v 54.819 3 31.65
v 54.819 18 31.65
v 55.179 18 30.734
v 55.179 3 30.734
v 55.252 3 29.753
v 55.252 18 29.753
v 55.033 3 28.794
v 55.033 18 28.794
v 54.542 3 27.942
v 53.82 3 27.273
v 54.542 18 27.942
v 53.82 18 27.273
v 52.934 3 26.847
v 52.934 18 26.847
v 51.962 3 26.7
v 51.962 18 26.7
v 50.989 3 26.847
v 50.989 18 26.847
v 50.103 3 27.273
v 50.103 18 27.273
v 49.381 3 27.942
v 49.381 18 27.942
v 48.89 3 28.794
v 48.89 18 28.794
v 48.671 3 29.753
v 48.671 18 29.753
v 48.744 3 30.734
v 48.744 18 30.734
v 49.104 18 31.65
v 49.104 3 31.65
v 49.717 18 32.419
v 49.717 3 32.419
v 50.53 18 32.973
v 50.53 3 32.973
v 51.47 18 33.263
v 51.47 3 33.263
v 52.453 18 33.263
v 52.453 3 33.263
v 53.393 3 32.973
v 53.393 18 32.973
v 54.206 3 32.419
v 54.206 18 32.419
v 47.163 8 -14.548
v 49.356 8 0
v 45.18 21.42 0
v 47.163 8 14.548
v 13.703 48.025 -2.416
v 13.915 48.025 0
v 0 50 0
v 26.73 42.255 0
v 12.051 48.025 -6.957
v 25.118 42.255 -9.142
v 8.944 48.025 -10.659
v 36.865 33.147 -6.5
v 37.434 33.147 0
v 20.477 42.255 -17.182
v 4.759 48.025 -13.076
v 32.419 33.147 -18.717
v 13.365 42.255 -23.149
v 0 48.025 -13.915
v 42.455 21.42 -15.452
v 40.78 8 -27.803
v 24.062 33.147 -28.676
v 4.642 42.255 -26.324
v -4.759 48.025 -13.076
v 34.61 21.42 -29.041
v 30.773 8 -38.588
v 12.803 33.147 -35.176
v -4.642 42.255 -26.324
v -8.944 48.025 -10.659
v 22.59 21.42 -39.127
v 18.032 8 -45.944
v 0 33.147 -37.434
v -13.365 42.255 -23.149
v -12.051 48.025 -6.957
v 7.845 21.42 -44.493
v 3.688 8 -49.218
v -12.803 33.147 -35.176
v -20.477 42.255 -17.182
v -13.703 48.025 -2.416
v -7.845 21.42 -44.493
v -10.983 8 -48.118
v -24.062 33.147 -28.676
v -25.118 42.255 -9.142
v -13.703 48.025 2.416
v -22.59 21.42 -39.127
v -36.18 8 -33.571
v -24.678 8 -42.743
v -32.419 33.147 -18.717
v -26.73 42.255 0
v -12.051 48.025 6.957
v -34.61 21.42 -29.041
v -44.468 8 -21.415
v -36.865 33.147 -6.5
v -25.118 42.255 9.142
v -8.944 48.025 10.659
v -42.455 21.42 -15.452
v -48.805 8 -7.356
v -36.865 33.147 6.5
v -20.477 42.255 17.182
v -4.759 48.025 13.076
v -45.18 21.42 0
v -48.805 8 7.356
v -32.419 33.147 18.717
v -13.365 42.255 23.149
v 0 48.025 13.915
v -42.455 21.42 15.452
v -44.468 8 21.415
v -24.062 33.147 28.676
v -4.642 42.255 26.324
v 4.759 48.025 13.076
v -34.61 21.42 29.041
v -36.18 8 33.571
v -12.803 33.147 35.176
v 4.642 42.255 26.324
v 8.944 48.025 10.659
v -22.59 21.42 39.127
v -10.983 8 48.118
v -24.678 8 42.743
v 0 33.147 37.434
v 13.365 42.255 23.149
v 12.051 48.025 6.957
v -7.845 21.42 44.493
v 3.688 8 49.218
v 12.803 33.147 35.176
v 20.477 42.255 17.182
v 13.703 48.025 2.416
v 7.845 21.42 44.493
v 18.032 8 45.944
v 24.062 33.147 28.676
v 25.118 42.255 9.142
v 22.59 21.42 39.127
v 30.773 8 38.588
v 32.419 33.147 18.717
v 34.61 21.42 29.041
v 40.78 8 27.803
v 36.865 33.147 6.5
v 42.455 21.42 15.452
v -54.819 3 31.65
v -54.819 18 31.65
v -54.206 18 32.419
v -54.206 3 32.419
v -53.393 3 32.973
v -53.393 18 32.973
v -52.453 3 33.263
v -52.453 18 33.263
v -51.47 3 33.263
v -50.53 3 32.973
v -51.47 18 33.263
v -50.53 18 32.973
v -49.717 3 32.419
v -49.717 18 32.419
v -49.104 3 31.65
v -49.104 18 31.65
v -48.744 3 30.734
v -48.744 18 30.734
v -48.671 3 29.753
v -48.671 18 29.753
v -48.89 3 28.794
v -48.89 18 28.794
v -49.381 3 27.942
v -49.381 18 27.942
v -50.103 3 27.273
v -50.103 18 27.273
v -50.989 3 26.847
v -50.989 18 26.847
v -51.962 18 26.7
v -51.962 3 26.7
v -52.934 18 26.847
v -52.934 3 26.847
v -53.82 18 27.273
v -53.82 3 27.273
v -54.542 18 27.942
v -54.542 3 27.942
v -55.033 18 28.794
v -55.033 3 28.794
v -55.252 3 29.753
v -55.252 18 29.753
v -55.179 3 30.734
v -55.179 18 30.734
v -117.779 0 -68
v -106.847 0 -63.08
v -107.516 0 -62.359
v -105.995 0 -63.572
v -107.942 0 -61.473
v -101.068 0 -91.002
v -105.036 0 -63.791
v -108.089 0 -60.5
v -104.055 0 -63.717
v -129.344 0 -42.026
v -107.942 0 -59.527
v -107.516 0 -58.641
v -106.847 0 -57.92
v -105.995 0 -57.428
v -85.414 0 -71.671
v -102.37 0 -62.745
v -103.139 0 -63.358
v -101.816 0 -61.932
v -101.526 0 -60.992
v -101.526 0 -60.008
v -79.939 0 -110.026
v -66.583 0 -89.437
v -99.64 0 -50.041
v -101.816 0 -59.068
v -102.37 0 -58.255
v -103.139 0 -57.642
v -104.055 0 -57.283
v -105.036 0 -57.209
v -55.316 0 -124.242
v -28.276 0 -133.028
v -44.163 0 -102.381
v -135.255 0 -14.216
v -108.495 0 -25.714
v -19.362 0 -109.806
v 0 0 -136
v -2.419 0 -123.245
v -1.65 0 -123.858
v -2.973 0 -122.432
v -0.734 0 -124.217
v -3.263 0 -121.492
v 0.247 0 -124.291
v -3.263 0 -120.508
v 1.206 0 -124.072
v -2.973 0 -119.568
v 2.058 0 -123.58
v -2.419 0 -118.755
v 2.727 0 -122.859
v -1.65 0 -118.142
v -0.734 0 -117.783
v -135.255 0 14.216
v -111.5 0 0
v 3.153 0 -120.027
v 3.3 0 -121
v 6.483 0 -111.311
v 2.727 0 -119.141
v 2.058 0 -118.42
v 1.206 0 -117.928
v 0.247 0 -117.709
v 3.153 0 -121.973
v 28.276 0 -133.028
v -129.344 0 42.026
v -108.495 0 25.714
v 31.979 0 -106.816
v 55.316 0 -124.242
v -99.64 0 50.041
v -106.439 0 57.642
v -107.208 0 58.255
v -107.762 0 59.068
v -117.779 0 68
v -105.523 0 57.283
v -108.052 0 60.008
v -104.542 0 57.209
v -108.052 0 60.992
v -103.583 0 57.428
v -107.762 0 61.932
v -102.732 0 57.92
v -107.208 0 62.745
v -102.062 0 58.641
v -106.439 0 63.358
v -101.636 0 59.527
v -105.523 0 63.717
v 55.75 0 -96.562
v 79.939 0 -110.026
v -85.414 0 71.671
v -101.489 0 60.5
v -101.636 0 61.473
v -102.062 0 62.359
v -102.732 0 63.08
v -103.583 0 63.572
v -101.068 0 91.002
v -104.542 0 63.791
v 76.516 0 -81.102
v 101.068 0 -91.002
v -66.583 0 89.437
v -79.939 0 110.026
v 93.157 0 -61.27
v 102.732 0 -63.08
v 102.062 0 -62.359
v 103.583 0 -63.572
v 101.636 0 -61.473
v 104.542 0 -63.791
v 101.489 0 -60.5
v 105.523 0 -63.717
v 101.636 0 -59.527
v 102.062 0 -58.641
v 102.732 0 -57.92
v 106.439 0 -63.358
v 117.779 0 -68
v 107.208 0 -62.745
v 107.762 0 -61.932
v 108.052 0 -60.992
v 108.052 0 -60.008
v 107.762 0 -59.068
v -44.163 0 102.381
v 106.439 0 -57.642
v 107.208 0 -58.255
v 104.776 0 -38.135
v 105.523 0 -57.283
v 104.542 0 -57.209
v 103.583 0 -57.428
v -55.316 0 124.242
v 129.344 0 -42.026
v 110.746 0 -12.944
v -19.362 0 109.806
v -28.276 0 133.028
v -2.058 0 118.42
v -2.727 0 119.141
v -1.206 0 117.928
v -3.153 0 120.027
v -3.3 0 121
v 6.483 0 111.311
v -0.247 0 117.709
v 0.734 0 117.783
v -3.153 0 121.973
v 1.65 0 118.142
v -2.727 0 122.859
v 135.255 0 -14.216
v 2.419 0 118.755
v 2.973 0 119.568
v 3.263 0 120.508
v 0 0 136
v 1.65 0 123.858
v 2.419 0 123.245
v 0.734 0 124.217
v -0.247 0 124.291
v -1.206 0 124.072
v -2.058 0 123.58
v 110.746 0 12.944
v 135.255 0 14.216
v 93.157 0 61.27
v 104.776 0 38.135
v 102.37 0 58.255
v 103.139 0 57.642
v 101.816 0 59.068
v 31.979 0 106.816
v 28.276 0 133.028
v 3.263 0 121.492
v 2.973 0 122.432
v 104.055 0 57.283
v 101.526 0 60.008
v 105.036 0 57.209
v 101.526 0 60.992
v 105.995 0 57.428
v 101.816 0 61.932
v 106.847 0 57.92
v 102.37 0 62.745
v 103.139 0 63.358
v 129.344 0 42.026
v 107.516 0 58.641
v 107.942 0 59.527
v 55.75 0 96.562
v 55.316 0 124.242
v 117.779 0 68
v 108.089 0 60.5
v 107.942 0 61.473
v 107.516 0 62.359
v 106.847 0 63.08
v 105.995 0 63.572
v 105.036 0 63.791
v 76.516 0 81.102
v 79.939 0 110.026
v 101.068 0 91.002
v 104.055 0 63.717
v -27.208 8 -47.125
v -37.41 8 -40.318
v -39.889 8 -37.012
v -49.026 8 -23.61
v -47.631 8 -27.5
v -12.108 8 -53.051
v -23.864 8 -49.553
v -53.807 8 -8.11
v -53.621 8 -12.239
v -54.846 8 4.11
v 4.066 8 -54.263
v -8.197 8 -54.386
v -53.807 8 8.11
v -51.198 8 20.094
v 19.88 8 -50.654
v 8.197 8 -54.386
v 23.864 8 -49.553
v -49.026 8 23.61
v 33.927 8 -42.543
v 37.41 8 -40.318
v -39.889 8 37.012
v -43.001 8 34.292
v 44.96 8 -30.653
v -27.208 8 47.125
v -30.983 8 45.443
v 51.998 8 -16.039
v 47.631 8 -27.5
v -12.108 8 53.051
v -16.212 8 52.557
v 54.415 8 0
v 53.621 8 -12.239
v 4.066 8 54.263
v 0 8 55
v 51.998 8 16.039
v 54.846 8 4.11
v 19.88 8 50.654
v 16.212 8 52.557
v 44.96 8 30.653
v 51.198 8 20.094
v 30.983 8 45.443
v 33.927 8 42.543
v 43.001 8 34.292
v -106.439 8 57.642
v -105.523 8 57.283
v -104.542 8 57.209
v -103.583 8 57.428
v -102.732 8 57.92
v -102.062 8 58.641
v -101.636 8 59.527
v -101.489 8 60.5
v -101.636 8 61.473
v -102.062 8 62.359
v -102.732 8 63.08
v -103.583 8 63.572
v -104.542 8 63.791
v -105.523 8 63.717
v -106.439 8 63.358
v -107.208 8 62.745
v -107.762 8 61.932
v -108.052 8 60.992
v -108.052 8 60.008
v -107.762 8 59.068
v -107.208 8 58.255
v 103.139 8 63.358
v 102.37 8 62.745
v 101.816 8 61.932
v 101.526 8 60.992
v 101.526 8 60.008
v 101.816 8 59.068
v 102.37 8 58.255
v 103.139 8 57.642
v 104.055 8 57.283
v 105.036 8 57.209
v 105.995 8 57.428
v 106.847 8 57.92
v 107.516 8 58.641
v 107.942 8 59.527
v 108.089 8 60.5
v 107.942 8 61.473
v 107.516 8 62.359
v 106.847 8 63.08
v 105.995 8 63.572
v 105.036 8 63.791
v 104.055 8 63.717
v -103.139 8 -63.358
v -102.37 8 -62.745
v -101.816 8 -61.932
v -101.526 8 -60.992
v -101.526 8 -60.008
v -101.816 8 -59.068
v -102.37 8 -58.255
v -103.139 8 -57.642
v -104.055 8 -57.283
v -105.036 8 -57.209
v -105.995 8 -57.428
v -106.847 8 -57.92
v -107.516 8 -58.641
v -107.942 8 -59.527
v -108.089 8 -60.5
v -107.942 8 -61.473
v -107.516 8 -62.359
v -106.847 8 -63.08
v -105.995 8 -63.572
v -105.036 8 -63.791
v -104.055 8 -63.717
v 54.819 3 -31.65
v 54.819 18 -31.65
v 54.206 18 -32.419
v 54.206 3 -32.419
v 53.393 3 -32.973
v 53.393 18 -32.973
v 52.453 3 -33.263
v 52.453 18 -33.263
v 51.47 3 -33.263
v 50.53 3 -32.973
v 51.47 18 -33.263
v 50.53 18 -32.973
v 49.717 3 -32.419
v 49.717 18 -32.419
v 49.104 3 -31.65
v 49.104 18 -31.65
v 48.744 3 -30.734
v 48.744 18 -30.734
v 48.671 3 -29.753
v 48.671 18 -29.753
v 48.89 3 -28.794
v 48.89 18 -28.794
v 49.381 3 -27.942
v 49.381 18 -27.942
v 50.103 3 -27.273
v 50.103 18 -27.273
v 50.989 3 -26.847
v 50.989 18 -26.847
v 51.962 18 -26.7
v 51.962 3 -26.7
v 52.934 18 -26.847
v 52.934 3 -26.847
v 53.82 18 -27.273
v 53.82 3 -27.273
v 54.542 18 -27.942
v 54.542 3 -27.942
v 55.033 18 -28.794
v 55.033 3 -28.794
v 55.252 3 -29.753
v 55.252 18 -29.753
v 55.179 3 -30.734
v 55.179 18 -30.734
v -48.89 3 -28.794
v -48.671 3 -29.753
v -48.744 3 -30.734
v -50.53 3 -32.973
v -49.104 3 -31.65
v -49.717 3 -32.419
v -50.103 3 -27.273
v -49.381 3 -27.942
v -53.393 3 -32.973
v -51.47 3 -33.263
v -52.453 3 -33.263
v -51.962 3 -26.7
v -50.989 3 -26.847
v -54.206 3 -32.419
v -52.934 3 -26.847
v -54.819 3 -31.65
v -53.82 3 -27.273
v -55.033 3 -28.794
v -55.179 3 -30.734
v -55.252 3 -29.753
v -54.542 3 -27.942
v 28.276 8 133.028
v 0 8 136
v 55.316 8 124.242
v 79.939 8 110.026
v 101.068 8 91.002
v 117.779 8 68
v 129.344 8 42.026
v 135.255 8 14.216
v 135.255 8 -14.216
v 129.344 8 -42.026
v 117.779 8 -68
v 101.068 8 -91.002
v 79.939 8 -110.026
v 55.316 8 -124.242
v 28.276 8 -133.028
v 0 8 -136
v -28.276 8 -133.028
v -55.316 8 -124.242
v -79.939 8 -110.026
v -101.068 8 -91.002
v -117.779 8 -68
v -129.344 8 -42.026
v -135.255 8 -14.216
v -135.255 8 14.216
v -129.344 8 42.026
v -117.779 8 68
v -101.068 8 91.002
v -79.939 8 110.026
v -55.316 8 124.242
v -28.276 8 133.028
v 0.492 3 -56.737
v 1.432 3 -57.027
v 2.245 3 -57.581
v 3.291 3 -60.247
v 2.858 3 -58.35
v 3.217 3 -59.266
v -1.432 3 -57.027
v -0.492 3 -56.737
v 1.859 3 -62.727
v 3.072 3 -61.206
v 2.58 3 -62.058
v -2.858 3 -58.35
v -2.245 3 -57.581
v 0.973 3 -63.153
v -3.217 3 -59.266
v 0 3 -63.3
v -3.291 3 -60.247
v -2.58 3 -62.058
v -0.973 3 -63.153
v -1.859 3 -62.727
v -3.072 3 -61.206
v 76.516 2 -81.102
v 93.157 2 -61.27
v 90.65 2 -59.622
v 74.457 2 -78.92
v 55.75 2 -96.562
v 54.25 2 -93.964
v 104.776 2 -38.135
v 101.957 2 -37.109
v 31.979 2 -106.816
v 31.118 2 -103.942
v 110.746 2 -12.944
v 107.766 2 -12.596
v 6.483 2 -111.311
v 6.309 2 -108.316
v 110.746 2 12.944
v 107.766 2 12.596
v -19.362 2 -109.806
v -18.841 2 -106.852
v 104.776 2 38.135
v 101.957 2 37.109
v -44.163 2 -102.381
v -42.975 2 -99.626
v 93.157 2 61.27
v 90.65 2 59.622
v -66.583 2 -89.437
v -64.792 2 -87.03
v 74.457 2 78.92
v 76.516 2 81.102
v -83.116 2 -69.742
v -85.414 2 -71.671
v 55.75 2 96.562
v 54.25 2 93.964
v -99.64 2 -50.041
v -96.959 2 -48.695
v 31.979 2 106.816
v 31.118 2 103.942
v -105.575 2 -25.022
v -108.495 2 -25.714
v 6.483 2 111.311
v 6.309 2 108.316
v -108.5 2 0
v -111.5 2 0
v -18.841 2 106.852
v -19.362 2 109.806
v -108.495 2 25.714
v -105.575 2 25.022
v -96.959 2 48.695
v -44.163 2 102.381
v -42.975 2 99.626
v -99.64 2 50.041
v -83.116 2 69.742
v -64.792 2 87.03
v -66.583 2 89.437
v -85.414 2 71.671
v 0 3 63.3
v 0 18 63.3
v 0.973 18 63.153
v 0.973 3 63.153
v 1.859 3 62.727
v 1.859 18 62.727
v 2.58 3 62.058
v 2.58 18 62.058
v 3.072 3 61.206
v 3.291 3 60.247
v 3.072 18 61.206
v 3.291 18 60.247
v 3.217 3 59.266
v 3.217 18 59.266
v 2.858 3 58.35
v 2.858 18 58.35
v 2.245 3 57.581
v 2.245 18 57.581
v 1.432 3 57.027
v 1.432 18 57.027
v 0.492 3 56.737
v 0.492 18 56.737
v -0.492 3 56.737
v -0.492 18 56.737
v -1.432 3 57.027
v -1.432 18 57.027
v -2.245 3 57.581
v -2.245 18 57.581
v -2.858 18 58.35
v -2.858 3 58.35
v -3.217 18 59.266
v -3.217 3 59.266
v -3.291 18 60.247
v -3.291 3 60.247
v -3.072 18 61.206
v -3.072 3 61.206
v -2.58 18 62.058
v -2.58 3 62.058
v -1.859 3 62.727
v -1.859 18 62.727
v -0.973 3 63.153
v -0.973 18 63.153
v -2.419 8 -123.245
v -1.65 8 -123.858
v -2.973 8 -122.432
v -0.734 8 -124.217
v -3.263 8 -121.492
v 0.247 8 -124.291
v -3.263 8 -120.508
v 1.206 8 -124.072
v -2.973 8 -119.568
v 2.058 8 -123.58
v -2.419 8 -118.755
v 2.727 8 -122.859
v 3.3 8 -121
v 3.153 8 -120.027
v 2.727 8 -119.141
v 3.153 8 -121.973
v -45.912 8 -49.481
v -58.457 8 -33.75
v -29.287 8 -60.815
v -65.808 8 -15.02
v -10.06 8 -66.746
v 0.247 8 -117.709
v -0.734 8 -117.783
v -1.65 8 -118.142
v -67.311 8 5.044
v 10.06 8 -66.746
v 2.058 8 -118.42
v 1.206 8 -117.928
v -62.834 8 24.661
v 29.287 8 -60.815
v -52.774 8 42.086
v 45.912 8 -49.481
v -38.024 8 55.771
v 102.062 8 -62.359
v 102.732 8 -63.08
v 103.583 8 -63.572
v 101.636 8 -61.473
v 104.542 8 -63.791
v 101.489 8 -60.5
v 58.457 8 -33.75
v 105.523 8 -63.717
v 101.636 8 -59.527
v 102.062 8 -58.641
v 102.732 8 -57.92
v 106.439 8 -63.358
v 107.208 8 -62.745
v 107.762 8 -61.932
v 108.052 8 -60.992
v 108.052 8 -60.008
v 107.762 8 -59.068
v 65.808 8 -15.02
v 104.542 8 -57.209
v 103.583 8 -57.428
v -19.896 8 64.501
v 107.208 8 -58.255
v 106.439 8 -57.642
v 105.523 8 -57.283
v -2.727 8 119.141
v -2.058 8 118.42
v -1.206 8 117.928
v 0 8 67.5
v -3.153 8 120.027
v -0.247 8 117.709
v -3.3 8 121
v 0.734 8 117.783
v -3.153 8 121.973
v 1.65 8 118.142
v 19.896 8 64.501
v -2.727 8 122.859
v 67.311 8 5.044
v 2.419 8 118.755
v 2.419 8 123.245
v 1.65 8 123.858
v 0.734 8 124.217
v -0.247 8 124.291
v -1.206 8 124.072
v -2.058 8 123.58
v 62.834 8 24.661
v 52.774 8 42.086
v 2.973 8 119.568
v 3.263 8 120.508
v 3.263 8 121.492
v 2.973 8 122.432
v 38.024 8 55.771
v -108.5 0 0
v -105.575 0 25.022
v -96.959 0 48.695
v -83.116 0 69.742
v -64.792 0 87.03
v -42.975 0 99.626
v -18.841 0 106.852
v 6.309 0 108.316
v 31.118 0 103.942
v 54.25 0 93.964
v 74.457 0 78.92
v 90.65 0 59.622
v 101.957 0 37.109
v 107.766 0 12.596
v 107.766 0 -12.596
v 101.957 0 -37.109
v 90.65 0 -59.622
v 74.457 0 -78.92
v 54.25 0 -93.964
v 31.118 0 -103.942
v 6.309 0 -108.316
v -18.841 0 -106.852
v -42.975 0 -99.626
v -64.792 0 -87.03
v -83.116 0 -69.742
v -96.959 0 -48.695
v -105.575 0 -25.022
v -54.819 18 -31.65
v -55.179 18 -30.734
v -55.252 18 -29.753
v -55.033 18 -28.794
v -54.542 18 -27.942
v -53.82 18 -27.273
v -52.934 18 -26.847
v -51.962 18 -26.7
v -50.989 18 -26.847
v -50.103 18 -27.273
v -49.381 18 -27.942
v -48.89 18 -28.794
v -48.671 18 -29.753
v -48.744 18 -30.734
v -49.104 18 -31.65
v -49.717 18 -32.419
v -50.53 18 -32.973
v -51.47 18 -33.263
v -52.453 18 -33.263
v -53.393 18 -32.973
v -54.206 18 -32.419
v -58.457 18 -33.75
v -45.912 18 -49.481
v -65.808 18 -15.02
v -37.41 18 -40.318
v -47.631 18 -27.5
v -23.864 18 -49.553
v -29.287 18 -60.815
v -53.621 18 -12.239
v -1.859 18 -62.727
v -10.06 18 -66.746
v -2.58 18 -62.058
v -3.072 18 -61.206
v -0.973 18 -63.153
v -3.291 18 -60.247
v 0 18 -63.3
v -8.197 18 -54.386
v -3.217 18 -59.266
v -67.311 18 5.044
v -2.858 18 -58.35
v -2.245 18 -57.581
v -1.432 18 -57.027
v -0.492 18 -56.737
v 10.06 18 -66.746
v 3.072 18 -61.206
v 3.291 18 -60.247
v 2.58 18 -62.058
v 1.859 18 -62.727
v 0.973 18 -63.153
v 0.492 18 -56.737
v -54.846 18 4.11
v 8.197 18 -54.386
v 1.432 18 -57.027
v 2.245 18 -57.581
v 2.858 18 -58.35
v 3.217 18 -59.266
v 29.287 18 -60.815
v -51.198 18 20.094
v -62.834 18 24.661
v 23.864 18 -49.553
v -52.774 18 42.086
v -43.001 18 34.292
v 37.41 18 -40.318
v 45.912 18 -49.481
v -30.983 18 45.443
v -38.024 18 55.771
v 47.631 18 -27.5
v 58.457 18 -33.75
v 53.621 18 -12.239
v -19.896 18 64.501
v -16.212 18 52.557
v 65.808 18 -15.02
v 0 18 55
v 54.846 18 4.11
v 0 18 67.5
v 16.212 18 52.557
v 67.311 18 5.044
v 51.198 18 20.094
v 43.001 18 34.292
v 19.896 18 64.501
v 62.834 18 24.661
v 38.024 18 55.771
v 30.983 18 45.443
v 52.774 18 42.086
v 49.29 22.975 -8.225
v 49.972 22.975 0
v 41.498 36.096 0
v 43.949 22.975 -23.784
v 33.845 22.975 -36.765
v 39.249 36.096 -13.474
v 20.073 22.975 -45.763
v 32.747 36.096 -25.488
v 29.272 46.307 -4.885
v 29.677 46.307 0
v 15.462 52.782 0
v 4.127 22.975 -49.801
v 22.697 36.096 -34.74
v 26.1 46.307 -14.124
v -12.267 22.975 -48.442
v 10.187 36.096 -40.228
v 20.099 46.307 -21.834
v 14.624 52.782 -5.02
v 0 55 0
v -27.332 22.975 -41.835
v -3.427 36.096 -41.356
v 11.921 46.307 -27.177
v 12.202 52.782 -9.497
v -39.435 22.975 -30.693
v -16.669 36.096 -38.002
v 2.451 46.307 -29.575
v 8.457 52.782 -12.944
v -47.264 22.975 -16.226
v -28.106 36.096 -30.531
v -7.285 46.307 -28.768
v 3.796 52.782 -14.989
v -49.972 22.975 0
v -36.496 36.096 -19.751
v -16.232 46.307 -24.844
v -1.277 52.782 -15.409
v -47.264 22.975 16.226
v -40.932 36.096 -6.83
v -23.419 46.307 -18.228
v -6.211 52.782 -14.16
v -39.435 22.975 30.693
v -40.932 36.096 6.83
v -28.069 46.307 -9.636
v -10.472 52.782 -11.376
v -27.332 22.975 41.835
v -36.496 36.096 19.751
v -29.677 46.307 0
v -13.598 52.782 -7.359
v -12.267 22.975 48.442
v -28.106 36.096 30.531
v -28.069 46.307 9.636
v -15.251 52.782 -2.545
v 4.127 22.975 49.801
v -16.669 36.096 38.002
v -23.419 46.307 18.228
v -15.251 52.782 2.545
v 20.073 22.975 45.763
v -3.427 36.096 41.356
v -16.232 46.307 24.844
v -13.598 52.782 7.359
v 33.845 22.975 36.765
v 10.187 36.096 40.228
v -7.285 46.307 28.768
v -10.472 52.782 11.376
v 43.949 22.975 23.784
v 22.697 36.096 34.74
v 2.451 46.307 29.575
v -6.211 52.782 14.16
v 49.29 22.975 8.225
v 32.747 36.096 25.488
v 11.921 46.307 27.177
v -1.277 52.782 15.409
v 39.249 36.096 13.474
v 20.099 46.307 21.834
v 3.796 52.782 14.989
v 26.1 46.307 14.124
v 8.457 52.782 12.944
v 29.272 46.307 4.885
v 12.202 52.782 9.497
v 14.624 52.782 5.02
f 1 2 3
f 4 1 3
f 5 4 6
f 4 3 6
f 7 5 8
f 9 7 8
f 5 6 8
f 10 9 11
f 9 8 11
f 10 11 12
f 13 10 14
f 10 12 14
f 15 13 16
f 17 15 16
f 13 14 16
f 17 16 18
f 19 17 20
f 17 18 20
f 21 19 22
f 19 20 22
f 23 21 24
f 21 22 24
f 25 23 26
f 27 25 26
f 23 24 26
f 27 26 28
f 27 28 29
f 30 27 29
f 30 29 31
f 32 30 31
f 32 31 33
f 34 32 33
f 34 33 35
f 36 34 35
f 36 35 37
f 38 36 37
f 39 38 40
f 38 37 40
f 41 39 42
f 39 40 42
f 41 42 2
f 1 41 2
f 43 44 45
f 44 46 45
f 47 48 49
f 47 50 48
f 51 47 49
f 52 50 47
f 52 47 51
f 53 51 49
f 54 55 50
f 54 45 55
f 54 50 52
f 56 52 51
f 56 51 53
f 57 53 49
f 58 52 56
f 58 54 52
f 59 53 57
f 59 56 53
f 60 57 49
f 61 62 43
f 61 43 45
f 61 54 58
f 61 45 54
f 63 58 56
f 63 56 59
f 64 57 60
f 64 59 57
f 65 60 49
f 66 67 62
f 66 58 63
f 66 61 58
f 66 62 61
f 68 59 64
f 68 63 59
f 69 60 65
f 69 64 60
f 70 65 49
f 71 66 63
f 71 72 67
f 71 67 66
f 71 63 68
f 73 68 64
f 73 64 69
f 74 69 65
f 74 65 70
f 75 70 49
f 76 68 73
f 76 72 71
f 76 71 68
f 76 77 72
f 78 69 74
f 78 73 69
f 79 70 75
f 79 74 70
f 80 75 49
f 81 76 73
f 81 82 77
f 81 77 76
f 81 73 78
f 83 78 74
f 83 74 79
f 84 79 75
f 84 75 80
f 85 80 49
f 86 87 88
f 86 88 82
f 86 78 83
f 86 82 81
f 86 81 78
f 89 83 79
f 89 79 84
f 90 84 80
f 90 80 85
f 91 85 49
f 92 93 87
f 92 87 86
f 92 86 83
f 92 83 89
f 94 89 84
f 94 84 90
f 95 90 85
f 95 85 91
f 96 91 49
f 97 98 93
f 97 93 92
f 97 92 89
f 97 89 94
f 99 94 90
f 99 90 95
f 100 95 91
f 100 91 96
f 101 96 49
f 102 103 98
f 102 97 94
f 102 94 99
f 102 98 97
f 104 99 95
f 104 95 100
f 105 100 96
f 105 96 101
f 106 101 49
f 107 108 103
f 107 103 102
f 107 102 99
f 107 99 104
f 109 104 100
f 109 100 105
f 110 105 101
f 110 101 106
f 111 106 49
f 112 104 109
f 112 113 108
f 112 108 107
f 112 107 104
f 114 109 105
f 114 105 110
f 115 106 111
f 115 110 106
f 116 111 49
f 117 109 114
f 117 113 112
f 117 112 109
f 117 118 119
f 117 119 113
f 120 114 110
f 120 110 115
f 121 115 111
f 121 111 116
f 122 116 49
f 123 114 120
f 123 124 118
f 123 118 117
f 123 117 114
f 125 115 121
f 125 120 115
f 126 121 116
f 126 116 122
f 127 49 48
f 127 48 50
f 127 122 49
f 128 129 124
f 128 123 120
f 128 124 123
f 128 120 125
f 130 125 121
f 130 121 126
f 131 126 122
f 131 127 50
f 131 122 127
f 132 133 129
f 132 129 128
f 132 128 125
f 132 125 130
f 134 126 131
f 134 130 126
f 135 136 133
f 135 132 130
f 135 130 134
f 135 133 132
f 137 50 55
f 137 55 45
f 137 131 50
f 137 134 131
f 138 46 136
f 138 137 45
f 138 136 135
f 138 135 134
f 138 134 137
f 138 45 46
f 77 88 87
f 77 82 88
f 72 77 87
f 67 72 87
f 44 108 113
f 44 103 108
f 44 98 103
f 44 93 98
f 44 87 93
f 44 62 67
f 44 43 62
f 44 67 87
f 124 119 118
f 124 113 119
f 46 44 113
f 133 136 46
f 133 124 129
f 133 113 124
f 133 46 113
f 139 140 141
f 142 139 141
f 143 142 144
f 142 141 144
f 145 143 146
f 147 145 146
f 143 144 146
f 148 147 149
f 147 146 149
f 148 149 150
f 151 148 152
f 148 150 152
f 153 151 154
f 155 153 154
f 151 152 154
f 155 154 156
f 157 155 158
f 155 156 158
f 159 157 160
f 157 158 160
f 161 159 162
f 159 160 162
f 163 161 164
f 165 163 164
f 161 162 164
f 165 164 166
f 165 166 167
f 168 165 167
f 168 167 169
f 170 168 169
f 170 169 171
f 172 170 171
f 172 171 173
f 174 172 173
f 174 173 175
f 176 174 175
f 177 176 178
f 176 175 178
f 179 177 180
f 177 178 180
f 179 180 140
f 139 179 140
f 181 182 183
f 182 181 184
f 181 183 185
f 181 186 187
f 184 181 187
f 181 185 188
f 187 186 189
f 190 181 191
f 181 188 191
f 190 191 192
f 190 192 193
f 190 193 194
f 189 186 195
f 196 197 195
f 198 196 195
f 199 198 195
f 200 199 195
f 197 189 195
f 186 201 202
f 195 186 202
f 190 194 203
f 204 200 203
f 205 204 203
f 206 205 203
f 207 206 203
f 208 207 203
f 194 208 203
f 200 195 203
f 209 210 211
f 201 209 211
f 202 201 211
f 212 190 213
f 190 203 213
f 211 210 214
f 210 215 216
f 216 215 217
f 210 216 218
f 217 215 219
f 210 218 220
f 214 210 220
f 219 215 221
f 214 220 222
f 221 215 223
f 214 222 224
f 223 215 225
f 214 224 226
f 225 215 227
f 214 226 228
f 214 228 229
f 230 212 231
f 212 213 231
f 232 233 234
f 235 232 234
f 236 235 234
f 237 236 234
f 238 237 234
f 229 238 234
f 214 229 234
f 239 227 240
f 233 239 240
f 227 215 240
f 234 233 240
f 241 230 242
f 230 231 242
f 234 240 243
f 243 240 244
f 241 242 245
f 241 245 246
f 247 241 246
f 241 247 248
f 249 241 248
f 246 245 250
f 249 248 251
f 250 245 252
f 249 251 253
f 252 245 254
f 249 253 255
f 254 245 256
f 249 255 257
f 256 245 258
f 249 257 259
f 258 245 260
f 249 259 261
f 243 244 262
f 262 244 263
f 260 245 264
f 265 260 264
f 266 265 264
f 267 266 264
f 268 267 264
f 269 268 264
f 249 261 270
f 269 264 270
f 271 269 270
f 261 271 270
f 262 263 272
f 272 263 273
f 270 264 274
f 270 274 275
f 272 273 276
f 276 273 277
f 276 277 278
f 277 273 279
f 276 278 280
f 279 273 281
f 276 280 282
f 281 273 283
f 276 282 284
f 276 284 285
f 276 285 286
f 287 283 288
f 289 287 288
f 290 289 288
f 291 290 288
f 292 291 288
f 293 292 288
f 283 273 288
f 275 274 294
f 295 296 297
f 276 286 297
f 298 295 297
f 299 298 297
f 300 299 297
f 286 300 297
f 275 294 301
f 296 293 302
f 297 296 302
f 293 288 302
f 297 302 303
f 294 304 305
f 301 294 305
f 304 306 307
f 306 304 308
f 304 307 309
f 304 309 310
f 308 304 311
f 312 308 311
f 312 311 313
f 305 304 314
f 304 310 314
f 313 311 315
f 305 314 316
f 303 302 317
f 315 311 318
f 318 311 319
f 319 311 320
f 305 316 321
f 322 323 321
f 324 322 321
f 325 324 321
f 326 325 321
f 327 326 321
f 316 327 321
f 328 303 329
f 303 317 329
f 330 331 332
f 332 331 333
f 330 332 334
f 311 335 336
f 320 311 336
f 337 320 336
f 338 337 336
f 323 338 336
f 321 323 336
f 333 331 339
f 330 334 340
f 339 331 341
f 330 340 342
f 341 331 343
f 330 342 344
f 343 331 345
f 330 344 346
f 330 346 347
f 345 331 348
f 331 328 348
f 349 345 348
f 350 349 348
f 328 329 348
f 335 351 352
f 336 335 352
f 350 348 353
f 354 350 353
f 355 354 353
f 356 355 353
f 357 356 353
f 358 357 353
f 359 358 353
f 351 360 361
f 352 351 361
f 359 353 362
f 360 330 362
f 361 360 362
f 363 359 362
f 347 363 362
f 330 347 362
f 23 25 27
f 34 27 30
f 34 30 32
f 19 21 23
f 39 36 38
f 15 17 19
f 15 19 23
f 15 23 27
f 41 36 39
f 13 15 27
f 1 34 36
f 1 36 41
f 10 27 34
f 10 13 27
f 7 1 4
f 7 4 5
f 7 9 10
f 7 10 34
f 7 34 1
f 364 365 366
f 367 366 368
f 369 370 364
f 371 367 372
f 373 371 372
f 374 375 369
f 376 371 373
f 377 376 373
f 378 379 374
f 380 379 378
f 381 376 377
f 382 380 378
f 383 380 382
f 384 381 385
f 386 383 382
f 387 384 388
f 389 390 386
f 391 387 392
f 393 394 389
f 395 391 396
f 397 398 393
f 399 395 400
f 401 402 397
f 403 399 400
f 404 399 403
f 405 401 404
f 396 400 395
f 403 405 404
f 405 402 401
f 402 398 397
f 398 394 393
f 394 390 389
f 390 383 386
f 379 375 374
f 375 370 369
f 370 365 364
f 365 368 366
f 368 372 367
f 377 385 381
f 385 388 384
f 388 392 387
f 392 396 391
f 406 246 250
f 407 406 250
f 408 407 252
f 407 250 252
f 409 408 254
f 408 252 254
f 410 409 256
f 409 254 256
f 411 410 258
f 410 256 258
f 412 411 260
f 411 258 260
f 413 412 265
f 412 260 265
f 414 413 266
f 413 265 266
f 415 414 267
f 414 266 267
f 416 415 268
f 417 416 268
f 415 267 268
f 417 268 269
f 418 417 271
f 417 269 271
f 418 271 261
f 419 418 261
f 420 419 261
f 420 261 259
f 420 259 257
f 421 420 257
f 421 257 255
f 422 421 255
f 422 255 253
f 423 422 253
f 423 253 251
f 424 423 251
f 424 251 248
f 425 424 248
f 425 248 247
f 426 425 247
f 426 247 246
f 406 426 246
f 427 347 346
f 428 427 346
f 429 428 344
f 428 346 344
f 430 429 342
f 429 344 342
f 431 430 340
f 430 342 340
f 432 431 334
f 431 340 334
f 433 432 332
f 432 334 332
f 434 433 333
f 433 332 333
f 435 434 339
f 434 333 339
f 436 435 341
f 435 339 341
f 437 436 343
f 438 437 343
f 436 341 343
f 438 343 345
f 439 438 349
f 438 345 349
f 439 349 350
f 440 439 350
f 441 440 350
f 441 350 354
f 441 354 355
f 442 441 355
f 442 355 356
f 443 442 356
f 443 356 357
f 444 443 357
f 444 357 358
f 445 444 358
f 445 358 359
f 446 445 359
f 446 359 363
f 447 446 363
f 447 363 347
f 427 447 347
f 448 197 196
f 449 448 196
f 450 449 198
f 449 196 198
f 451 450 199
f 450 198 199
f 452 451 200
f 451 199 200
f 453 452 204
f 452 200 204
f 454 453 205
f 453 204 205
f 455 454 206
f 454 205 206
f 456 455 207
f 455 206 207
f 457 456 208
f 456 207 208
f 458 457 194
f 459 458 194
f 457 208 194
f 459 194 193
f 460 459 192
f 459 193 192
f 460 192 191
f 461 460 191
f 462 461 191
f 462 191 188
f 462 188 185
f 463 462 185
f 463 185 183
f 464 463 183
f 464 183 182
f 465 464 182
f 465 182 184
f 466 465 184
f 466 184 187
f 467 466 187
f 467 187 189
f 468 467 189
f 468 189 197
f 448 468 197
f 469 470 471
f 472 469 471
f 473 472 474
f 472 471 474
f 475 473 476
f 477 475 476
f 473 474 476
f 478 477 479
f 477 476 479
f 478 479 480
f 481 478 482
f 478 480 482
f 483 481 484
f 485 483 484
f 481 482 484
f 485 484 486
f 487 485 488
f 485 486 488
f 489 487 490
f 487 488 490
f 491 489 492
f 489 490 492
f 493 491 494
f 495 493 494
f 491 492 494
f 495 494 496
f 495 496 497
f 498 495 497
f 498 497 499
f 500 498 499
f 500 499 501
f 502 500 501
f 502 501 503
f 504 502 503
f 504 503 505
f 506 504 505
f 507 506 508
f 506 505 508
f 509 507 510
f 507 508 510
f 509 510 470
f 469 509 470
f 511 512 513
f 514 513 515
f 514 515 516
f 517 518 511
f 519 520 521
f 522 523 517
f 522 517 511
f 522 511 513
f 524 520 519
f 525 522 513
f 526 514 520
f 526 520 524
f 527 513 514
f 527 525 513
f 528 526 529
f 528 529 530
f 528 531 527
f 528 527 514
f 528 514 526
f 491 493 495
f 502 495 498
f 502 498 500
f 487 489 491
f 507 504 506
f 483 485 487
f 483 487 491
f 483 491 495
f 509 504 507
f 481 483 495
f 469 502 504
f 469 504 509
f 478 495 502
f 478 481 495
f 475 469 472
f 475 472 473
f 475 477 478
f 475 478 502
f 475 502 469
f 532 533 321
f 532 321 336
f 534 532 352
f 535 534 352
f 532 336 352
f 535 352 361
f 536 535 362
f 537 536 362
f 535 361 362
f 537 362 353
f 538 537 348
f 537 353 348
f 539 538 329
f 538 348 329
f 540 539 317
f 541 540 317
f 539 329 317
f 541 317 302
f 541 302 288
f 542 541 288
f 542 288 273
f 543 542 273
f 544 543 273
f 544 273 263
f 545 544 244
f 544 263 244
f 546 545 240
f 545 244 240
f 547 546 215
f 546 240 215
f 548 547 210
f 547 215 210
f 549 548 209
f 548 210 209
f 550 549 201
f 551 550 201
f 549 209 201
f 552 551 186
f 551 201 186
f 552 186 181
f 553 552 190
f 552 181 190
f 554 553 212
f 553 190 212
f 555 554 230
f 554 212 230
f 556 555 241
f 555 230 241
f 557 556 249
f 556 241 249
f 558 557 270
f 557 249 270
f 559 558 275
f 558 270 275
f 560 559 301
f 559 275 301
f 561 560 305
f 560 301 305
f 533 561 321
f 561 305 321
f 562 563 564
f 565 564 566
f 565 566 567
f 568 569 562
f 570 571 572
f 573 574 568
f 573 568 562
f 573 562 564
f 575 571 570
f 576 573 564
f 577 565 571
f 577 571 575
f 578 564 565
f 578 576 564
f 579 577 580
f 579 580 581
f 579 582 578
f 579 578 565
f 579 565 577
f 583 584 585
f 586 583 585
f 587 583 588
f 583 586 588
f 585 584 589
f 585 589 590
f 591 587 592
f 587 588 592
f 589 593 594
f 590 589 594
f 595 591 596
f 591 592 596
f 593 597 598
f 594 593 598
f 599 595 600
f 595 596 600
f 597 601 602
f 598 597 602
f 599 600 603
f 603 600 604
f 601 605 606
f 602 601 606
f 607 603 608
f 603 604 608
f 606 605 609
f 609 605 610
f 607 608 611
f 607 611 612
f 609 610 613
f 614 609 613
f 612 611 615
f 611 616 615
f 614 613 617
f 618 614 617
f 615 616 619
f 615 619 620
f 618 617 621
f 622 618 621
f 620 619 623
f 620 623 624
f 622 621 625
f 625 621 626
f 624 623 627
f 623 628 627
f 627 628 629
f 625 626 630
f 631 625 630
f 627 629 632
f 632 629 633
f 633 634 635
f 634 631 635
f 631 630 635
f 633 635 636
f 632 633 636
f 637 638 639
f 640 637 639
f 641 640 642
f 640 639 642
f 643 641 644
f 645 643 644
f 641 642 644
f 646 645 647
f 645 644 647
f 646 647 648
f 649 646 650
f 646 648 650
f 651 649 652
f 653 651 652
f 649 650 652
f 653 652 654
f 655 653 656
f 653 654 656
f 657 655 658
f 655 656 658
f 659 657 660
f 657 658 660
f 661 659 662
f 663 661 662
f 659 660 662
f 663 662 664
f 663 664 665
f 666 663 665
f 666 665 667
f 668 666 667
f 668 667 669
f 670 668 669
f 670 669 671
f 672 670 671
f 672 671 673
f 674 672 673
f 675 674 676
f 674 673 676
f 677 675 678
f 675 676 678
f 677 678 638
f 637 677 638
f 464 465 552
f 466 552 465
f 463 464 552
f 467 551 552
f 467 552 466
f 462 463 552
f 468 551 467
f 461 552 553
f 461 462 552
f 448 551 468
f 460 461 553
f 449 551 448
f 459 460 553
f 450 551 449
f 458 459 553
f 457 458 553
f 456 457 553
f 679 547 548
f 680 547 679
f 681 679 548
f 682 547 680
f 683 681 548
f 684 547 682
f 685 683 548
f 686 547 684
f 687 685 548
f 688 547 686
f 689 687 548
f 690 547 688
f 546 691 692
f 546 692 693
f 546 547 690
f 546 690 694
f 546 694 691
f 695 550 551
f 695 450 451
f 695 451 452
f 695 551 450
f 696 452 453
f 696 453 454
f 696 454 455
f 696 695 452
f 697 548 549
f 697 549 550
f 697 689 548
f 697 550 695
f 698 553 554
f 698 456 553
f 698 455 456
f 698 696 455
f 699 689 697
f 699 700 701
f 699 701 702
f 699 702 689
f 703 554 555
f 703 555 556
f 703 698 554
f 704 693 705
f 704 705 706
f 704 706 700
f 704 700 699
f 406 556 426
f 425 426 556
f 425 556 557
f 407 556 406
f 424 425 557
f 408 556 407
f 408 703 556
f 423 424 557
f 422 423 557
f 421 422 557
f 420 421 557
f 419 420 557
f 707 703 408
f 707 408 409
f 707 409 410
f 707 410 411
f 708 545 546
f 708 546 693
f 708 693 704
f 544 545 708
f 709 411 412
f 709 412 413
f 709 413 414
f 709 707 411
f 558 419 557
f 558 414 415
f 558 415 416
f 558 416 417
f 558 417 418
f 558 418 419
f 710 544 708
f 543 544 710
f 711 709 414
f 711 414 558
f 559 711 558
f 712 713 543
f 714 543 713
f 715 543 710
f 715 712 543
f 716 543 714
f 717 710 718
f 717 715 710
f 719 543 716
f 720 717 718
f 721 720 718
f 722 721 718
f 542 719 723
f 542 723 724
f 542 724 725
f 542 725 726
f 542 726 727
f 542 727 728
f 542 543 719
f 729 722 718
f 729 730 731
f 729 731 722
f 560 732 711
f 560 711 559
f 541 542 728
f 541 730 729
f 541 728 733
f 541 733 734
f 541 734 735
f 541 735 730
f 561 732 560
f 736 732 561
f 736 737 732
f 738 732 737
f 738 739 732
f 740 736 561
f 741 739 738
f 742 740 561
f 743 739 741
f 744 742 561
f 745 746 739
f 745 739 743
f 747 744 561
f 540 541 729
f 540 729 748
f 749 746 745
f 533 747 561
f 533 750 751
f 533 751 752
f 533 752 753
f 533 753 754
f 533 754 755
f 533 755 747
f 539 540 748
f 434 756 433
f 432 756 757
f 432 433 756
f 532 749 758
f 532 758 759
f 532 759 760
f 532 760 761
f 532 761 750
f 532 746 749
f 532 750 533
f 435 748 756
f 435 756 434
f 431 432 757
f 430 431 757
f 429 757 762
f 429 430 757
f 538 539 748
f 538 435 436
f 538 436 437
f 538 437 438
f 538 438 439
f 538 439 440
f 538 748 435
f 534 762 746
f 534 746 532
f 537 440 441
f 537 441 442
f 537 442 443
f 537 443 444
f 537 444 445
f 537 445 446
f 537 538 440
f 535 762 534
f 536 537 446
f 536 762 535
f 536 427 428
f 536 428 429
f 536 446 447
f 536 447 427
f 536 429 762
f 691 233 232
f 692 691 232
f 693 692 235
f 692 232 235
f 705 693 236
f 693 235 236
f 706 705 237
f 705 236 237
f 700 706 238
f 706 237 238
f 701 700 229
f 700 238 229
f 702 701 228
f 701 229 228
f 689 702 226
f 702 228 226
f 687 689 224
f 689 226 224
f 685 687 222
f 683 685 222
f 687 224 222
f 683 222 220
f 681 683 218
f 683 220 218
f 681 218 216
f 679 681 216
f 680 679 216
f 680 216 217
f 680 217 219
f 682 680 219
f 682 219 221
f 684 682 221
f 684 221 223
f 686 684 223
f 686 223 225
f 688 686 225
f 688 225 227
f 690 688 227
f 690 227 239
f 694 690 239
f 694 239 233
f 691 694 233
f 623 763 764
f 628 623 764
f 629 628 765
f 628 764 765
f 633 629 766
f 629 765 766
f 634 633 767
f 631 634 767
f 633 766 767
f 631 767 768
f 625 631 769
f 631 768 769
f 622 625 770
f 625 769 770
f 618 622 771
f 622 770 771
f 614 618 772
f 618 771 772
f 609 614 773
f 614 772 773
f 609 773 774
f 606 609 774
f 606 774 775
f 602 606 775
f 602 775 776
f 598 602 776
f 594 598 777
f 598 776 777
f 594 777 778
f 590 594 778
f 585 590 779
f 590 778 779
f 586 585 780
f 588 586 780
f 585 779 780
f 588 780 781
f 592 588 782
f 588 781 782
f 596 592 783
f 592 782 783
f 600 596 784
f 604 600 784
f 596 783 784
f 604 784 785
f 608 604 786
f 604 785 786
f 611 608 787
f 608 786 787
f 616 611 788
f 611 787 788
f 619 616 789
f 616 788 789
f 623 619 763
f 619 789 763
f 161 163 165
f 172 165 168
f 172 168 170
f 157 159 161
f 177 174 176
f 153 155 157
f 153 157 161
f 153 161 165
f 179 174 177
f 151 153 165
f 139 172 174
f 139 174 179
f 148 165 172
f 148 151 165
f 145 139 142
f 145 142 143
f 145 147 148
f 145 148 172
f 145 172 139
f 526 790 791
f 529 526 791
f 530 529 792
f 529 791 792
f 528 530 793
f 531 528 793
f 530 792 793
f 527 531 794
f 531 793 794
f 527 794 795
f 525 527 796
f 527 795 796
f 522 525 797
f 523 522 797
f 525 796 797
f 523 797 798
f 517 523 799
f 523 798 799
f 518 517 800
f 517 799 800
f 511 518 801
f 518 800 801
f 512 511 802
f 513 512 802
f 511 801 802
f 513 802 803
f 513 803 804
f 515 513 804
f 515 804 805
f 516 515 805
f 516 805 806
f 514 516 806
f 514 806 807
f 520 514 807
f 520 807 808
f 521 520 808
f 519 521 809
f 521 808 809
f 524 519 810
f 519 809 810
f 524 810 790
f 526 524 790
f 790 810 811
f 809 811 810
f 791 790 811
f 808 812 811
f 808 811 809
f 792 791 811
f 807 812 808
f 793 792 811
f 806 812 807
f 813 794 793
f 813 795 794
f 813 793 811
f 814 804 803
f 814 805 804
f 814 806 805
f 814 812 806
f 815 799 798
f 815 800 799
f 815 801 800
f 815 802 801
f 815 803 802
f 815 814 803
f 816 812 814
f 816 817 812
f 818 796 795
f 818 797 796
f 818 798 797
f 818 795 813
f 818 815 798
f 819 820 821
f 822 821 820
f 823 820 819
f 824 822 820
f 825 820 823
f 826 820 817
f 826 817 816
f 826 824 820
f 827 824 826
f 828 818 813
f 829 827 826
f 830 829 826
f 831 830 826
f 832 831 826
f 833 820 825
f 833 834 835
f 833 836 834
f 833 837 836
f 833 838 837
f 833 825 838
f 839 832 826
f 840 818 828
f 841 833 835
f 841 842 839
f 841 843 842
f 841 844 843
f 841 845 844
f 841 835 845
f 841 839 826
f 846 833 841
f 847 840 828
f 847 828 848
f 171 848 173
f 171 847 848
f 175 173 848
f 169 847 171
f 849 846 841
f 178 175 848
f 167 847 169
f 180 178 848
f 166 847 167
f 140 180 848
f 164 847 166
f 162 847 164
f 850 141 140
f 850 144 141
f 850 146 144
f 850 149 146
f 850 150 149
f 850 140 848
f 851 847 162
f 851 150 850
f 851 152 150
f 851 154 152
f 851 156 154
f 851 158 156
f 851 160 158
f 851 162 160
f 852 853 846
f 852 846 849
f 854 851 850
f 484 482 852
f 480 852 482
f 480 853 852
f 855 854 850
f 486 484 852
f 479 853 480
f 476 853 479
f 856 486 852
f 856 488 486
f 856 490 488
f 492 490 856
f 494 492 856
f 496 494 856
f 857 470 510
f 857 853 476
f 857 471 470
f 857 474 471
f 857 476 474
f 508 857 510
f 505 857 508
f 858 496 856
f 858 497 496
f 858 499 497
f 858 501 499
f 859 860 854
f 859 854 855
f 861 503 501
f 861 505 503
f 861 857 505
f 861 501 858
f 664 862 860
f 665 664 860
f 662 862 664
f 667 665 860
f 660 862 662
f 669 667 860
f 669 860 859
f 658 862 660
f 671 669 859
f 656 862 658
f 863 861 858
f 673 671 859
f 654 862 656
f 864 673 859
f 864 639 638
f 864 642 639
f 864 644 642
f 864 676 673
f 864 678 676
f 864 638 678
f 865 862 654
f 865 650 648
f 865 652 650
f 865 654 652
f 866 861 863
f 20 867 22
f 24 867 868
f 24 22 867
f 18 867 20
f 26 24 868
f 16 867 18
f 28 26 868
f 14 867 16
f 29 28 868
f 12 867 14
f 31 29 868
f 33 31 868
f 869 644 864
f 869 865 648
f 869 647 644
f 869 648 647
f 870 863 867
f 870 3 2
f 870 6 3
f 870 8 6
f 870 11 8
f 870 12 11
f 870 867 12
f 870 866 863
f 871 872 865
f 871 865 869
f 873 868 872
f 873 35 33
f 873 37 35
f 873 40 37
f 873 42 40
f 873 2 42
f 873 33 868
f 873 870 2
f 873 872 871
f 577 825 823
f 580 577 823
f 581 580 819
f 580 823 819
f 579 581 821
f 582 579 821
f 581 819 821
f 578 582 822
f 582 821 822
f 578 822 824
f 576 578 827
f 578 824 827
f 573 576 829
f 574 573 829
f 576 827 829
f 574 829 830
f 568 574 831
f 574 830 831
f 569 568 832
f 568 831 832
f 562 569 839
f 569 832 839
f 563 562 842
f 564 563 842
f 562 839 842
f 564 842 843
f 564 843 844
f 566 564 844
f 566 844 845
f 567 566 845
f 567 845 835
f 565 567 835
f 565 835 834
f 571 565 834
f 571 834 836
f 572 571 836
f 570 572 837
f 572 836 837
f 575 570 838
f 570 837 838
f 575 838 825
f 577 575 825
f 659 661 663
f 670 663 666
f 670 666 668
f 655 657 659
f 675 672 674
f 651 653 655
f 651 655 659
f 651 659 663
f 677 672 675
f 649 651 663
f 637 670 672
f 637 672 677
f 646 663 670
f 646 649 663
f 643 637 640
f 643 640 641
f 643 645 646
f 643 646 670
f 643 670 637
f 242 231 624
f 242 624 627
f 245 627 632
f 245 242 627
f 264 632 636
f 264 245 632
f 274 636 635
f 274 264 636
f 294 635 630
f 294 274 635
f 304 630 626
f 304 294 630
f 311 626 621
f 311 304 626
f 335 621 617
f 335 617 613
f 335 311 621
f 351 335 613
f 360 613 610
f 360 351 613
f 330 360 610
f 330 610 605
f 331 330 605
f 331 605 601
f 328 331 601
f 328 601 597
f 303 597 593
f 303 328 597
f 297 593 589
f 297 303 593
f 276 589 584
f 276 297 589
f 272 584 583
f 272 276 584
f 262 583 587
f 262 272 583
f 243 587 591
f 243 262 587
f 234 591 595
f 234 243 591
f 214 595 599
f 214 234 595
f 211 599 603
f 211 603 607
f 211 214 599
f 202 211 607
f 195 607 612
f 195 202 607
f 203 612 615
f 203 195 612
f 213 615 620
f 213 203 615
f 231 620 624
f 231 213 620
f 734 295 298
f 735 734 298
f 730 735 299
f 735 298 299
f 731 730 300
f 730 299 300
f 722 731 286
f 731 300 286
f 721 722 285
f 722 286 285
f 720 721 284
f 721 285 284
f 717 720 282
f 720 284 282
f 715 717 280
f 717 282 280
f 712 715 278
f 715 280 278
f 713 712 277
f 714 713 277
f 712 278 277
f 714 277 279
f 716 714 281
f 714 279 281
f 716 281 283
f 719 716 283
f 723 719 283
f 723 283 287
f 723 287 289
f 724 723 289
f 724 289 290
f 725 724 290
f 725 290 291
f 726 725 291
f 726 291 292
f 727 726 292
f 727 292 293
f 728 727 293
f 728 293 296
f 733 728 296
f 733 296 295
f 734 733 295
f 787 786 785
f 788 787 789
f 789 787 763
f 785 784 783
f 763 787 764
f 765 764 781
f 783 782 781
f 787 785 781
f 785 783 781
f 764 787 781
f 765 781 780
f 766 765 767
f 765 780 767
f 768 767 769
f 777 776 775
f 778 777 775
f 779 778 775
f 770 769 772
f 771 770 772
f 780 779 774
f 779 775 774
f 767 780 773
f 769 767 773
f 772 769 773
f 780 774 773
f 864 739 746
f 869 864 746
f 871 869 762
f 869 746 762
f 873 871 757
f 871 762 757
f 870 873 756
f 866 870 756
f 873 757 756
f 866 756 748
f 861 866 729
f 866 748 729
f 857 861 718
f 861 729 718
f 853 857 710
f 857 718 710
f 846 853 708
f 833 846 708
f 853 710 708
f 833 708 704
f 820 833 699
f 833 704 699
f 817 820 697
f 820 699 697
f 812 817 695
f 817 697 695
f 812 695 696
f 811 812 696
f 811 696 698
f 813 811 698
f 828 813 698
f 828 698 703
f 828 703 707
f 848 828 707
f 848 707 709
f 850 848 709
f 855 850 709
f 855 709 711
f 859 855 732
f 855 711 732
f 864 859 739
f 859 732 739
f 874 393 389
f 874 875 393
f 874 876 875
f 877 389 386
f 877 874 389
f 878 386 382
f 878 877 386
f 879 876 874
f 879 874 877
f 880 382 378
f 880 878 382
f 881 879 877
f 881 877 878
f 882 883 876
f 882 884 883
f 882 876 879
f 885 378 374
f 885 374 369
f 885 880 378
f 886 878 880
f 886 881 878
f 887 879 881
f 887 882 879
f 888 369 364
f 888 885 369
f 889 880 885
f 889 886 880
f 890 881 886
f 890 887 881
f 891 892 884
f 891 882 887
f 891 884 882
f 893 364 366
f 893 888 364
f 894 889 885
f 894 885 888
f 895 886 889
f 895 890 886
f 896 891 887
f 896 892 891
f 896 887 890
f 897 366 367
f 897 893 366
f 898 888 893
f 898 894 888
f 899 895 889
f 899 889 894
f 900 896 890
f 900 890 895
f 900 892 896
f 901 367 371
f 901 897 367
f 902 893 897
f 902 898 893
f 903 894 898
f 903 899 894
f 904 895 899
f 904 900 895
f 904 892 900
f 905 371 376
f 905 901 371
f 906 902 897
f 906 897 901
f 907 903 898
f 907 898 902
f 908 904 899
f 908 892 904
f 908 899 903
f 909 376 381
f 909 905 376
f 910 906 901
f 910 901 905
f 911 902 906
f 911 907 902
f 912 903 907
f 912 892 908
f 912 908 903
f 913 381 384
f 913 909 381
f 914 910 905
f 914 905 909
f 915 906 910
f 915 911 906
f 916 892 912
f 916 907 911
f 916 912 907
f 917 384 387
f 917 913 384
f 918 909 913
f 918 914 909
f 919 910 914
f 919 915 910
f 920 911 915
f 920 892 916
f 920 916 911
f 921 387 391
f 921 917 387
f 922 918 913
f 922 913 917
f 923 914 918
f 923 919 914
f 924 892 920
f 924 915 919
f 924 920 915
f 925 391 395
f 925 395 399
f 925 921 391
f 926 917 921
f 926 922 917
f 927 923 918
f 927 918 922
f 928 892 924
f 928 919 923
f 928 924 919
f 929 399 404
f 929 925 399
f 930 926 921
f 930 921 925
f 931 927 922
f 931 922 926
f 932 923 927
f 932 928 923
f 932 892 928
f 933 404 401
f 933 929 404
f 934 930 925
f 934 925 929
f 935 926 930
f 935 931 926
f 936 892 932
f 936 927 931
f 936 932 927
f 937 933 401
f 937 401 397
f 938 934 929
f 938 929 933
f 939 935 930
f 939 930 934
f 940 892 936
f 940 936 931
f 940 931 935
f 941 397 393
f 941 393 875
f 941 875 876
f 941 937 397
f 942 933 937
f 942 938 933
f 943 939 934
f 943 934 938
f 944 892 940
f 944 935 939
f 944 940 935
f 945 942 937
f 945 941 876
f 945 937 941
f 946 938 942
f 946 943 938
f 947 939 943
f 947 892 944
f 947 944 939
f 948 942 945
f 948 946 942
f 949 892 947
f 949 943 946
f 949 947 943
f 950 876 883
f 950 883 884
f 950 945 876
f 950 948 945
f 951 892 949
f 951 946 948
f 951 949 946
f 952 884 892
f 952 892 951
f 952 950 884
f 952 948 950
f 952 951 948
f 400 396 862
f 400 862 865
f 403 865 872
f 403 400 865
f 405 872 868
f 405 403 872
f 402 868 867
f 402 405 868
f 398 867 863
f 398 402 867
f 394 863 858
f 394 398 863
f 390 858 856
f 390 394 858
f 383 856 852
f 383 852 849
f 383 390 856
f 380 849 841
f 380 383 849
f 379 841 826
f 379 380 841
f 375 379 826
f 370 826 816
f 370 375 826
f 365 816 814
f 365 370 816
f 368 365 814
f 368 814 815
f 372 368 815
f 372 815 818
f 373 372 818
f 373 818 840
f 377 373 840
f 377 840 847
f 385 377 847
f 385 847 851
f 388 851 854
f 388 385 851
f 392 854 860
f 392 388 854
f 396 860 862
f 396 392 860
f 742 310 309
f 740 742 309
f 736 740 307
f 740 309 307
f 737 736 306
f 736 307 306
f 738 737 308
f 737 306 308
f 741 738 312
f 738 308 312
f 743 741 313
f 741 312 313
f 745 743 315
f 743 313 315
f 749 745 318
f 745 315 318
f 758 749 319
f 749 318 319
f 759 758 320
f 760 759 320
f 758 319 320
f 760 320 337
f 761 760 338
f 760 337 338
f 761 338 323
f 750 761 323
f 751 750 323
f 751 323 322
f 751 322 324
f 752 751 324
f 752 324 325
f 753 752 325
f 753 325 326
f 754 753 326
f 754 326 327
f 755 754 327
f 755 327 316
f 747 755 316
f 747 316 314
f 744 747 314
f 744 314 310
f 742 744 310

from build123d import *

# Parameters (mm, degrees)
SKETCH2_R           = 136
BOSS_EXTRUDE1_DEPTH = 8
SKETCH3_R           = 111.5
SKETCH3_R_2         = 108.5
CUT_EXTRUDE1_DEPTH  = 2
SKETCH4_R           = 3.3
CUT_EXTRUDE2_DEPTH  = 22
CIRPATTERN1_COUNT   = 6
SKETCH6_R           = 67.5
SKETCH6_R_2         = 55
BOSS_EXTRUDE2_DEPTH = 10
SKETCH7_R           = 3.3
CUT_EXTRUDE3_DEPTH  = 15
CIRPATTERN2_COUNT   = 6


with BuildPart() as part:
    # Sketch1 → Revolve1 (revolve)
    with BuildSketch(Plane.XY, mode=Mode.PRIVATE) as revolve1_sk:
        with BuildLine():
            Line((-65, 0), (-65, 5))
            Line((-65, 5), (-54.772255751, 5))
            ThreePointArc((-54.772255751, 5), (-37.080992435, 40.620192023), (0, 55))
            Line((0, 55), (0, 50))
            ThreePointArc((0, 50), (-35.355339059, 35.355339059), (-50, 0))
            Line((-50, 0), (-65, 0))
        make_face()
    revolve(revolve1_sk.sketch.rotate(Axis((0, 0, 0), (0, 1, 0)), 180), axis=Axis((0, 0, 0), (0, 1, 0)))

    # Sketch2 → Boss-Extrude1 (add)
    with BuildSketch(Plane(origin=(0, 0, 0), x_dir=(1, 0, 0), z_dir=(0, 1, 0))):
        with Locations(Location((0, 0, 0), (0, 0, 270))):
            Circle(SKETCH2_R)
    extrude(amount=BOSS_EXTRUDE1_DEPTH)

    # Sketch3 → Cut-Extrude1 (cut)
    with BuildSketch(Plane(origin=(0, 0, 0), x_dir=(1, 0, 0), z_dir=(0, 1, 0))):
        with Locations(Location((0, 0, 0), (0, 0, 180))):
            Circle(SKETCH3_R)
        with Locations(Location((0, 0, 0), (0, 0, 180))):
            Circle(SKETCH3_R_2, mode=Mode.SUBTRACT)
    extrude(amount=CUT_EXTRUDE1_DEPTH, mode=Mode.SUBTRACT)

    # Sketch4 → Cut-Extrude2 (cut)
    with BuildSketch(Plane(origin=(0, 0, 0), x_dir=(-1, 0, 0), z_dir=(0, -1, 0))):
        with Locations(Location((0, 121, 0), (0, 0, 180))):
            Circle(SKETCH4_R)
    cut_extrude2 = extrude(amount=-CUT_EXTRUDE2_DEPTH, mode=Mode.SUBTRACT)

    # CirPattern1: Cut-Extrude2 ×6 about axis
    cirpattern1_axis = Axis((0, 0, 0), (0, 1, 0))
    for i in range(1, CIRPATTERN1_COUNT):
        add(cut_extrude2.rotate(cirpattern1_axis, i * 360 / CIRPATTERN1_COUNT), mode=Mode.SUBTRACT)

    # Sketch6 → Boss-Extrude2 (add)
    with BuildSketch(Plane(origin=(0, 8, 0), x_dir=(1, 0, 0), z_dir=(0, 1, 0))):
        with Locations(Location((0, 0, 0), (0, 0, 270))):
            Circle(SKETCH6_R)
        with Locations(Location((0, 0, 0), (0, 0, 270))):
            Circle(SKETCH6_R_2, mode=Mode.SUBTRACT)
    extrude(amount=BOSS_EXTRUDE2_DEPTH)

    # Sketch7 → Cut-Extrude3 (cut)
    with BuildSketch(Plane(origin=(0, 18, 0), x_dir=(1, 0, 0), z_dir=(0, 1, 0))):
        with Locations(Location((0, -60, 0), (0, 0, 270))):
            Circle(SKETCH7_R)
    cut_extrude3 = extrude(amount=-CUT_EXTRUDE3_DEPTH, mode=Mode.SUBTRACT)

    # CirPattern2: Cut-Extrude3 ×6 about axis
    cirpattern2_axis = Axis((0, 0, 0), (0, 1, 0))
    for i in range(1, CIRPATTERN2_COUNT):
        add(cut_extrude3.rotate(cirpattern2_axis, i * 360 / CIRPATTERN2_COUNT), mode=Mode.SUBTRACT)


solid = part.part
